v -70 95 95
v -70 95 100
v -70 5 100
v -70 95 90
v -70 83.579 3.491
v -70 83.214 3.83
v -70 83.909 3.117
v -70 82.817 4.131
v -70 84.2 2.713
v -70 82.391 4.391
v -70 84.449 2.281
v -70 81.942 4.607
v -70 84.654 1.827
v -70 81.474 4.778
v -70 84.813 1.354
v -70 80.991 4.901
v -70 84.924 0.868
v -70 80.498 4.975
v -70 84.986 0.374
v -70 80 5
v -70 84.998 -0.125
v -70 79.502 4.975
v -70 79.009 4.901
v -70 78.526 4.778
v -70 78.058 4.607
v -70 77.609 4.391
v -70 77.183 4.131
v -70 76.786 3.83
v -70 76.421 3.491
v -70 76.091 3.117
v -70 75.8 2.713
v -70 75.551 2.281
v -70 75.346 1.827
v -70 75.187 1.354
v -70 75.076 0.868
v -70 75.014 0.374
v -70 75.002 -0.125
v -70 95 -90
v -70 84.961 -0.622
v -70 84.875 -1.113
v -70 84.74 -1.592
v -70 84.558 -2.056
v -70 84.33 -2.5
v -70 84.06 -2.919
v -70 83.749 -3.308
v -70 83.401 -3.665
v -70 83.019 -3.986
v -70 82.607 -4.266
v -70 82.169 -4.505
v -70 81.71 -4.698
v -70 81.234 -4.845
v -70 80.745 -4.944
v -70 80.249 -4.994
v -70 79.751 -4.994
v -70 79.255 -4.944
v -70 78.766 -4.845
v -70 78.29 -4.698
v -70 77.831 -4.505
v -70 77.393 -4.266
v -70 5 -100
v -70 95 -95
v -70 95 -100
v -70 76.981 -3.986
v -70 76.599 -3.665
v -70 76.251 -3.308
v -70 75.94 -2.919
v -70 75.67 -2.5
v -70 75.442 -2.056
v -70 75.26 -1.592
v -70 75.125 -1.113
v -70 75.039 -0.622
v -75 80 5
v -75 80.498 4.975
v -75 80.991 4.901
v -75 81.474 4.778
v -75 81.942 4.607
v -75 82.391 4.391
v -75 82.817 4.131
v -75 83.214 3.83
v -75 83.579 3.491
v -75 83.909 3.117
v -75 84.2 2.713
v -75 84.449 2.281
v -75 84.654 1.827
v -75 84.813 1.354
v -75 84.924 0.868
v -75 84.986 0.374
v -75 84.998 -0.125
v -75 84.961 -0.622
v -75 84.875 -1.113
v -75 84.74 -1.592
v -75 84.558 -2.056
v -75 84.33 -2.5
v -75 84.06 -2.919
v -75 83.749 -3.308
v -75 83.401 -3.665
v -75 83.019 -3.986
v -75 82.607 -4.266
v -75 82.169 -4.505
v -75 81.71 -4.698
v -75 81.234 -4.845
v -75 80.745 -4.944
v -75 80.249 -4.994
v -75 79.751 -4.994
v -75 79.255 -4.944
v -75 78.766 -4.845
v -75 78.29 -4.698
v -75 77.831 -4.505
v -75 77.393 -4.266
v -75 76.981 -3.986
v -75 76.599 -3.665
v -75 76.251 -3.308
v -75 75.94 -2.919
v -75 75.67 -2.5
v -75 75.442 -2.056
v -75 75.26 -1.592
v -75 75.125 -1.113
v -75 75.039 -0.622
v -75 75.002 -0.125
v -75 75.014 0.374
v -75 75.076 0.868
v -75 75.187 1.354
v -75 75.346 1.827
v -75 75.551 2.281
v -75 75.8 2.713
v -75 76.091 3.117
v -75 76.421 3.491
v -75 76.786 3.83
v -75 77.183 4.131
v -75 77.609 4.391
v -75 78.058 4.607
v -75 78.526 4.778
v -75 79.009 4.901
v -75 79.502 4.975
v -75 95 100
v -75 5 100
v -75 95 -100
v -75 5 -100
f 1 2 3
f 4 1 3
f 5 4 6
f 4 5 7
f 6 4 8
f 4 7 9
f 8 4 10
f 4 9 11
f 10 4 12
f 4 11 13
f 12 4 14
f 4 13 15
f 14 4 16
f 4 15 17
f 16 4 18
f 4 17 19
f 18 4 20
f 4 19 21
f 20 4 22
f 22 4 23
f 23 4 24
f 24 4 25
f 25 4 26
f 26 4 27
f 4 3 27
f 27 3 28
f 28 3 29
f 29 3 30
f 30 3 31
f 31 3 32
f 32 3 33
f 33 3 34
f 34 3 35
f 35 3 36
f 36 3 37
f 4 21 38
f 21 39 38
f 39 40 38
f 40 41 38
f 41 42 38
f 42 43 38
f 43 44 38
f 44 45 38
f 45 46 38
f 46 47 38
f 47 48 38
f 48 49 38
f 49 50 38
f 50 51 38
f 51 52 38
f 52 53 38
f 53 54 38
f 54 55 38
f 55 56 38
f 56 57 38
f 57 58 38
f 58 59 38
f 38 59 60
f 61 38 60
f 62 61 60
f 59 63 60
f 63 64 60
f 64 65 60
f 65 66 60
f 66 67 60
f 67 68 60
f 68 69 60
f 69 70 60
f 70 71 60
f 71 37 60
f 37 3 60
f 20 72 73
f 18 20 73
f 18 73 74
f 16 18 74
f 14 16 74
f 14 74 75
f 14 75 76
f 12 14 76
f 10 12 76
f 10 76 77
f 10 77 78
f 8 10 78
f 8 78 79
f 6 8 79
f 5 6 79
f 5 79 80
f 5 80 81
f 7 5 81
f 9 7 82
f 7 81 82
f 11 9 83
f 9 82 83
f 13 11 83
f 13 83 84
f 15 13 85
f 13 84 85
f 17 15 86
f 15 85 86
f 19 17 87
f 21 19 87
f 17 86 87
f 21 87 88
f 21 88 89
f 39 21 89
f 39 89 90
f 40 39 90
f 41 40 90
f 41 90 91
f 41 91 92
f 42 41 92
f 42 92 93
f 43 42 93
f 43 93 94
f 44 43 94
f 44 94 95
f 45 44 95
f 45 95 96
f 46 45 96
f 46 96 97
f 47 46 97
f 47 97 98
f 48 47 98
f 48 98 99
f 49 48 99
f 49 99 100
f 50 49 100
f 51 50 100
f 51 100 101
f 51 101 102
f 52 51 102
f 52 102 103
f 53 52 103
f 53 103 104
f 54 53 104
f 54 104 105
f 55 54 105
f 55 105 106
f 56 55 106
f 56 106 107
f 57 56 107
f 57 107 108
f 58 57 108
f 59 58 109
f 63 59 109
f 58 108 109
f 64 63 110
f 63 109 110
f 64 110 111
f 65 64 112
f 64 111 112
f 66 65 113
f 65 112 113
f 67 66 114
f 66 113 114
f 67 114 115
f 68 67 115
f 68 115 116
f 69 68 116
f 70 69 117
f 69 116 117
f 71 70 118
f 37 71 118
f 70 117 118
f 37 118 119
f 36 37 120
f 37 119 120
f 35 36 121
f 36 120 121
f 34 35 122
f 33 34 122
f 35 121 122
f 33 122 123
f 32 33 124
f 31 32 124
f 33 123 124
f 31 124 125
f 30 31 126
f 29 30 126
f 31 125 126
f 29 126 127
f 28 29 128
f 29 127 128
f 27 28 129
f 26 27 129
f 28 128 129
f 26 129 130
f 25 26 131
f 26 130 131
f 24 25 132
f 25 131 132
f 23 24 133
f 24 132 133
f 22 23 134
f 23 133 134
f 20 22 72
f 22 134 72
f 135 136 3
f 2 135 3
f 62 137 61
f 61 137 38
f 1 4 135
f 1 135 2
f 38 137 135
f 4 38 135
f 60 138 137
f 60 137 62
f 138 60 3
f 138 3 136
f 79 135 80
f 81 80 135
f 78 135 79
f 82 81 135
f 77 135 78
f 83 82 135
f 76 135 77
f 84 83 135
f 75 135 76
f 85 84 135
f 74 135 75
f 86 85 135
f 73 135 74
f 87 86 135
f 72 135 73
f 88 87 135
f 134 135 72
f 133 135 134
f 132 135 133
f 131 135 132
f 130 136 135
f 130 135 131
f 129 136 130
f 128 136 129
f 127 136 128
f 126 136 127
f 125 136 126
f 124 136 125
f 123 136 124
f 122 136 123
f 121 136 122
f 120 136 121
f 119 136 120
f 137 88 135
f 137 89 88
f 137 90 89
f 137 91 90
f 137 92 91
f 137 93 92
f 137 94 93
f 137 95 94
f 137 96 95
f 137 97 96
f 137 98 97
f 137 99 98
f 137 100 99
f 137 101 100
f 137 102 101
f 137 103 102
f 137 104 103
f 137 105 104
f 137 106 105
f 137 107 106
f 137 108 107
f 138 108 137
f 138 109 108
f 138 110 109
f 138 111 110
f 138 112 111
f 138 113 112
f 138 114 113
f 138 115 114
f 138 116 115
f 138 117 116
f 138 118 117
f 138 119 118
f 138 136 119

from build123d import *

# Parameters (mm, degrees)
SKETCH1_W           = 150
SKETCH1_H           = 200
BOSS_EXTRUDE1_DEPTH = 100
SHELL2_T            = -5
SKETCH5_R           = 1.9
CUT_EXTRUDE2_DEPTH  = 10
BOSS_EXTRUDE4_DEPTH = 200
SKETCH9_W           = 101.133931545
SKETCH9_H           = 31.996148617
CUT_EXTRUDE4_DEPTH  = 236.849528301
SKETCH10_R          = 4
CUT_EXTRUDE5_DEPTH  = 10
CUT_EXTRUDE7_REACH  = 162.078
SKETCH11_W          = 140
SKETCH11_H          = 5
SKETCH15_R          = 1.2
CUT_EXTRUDE11_DEPTH = 10
SKETCH36_W          = 60
SKETCH36_H          = 5
BOSS_EXTRUDE7_DEPTH = 10
SKETCH37_R          = 3.5
CUT_EXTRUDE15_DEPTH = 60
SKETCH38_R          = 5
CUT_EXTRUDE16_DEPTH = 70
SKETCH41_W          = 161.400055229
SKETCH41_H          = 90
CUT_EXTRUDE19_DEPTH = 236.849528301


with BuildPart() as part:
    # Sketch1 → Boss-Extrude1 (new body)
    with BuildSketch(Plane(origin=(0, 0, 0), x_dir=(1, 0, 0), z_dir=(0, 1, 0))):
        Rectangle(SKETCH1_W, SKETCH1_H)
    extrude(amount=BOSS_EXTRUDE1_DEPTH)

    # Shell2
    shell2_openings = [part.faces().sort_by_distance(p)[0] for p in [
        (0, 50, -100),
        (0, 50, 100),
    ]]
    offset(amount=SHELL2_T, openings=shell2_openings, kind=Kind.INTERSECTION)

    # Sketch5 → Cut-Extrude2 (cut)
    with BuildSketch(Plane.XZ):
        with Locations(Location((-65, 91, 0), (0, 0, 270))):
            Circle(SKETCH5_R)
        with Locations(Location((-35, 91, 0), (0, 0, 270))):
            Circle(SKETCH5_R)
        with Locations(Location((-65, 67, 0), (0, 0, 270))):
            Circle(SKETCH5_R)
        with Locations(Location((-35, 67, 0), (0, 0, 270))):
            Circle(SKETCH5_R)
    cut_extrude2 = extrude(amount=-CUT_EXTRUDE2_DEPTH, mode=Mode.SUBTRACT)

    # Mirror2: Cut-Extrude2 across plane
    add(cut_extrude2.mirror(Plane.XY), mode=Mode.SUBTRACT)

    # Sketch8 → Boss-Extrude4 (add, through all)
    with BuildSketch(Plane.XY.offset(100)):
        Polygon((-15, 17), (75, 17), (75, 22), (-20, 22), (-20, 0), (-15, 0), align=None)
    extrude(amount=-BOSS_EXTRUDE4_DEPTH)

    # Sketch9 → Cut-Extrude4 (cut, through all)
    with BuildSketch(Plane.XY.offset(100)):
        with Locations((35.566965773, 1.001925691)):
            Rectangle(SKETCH9_W, SKETCH9_H)
    extrude(amount=-CUT_EXTRUDE4_DEPTH, mode=Mode.SUBTRACT)

    # Sketch10 → Cut-Extrude5 (cut)
    with BuildSketch(Plane.XZ.offset(-17)):
        with Locations((60, 0)):
            Circle(SKETCH10_R)
    extrude(amount=-CUT_EXTRUDE5_DEPTH, mode=Mode.SUBTRACT)

    # Cut-Extrude7: up to this face of the body (flat: up to its plane)
    cut_extrude7_end = Plane(part.part.faces().sort_by_distance((-44.954220044, 5, 0))[0])
    # Sketch11 → Cut-Extrude7 (cut, up to the picked face)
    with BuildSketch(Plane(origin=(0, 100, 0), x_dir=(1, 0, 0), z_dir=(0, 1, 0)), mode=Mode.PRIVATE) as cut_extrude7_sk1:
        with Locations((0, -92.5)):
            Rectangle(SKETCH11_W, SKETCH11_H)
    cut_extrude7_tool1 = split(extrude(cut_extrude7_sk1.sketch, amount=-CUT_EXTRUDE7_REACH, mode=Mode.PRIVATE), bisect_by=cut_extrude7_end, keep=Keep.BOTH, mode=Mode.PRIVATE)
    cut_extrude7 = cut_extrude7_tool1.solids().sort_by(Axis((0, 100, 92.5), (0, -1, 0)))[0]
    add(cut_extrude7, mode=Mode.SUBTRACT)

    # Mirror3: Cut-Extrude7 across plane
    add(cut_extrude7.mirror(Plane.XY), mode=Mode.SUBTRACT)

    # Sketch15 → Cut-Extrude11 (cut)
    with BuildSketch(Plane(origin=(0, 100, 0), x_dir=(1, 0, 0), z_dir=(0, 1, 0))):
        with Locations(Location((50, 28, 0), (0, 0, 270))):
            Circle(SKETCH15_R)
        with Locations(Location((50, -28, 0), (0, 0, 270))):
            Circle(SKETCH15_R)
        with Locations(Location((-20, 20, 0), (0, 0, 270))):
            Circle(SKETCH15_R)
        with Locations(Location((-20, -20, 0), (0, 0, 270))):
            Circle(SKETCH15_R)
    extrude(amount=-CUT_EXTRUDE11_DEPTH, mode=Mode.SUBTRACT)

    # Sketch36 → Boss-Extrude7 (add)
    with BuildSketch(Plane.ZY.offset(-70)):
        with Locations((-13.202053215, 62.5)):
            Rectangle(SKETCH36_W, SKETCH36_H)
    boss_extrude7 = extrude(amount=BOSS_EXTRUDE7_DEPTH)

    # Mirror5: Boss-Extrude7 across plane
    add(boss_extrude7.mirror(Plane(origin=(0, 0, 0), x_dir=(0, 0, 1), z_dir=(1, 0, 0))))

    # Sketch37 → Cut-Extrude15 (cut)
    with BuildSketch(Plane(origin=(75, 0, 0), x_dir=(0, 0, -1), z_dir=(1, 0, 0))):
        with Locations((0, 75)):
            Circle(SKETCH37_R)
    extrude(amount=-CUT_EXTRUDE15_DEPTH, mode=Mode.SUBTRACT)

    # Sketch38 → Cut-Extrude16 (cut)
    with BuildSketch(Plane.ZY.offset(75)):
        with Locations((0, 80)):
            Circle(SKETCH38_R)
    extrude(amount=-CUT_EXTRUDE16_DEPTH, mode=Mode.SUBTRACT)

    # Sketch41 → Cut-Extrude19 (cut, through all)
    with BuildSketch(Plane.XY.offset(100)):
        Polygon((-133.177931689, 95), (-70, 95), (91.400055229, 95), (91.400055229, 145.714177441), (-133.177931689, 145.714177441), align=None)
        with Locations((10.700027615, 50)):
            Rectangle(SKETCH41_W, SKETCH41_H)
        Polygon((91.400055229, 5), (-70, 5), (-160.904455041, 5), (-160.904455041, -24.977011319), (91.400055229, -24.977011319), align=None)
    extrude(amount=-CUT_EXTRUDE19_DEPTH, mode=Mode.SUBTRACT)


solid = part.part
